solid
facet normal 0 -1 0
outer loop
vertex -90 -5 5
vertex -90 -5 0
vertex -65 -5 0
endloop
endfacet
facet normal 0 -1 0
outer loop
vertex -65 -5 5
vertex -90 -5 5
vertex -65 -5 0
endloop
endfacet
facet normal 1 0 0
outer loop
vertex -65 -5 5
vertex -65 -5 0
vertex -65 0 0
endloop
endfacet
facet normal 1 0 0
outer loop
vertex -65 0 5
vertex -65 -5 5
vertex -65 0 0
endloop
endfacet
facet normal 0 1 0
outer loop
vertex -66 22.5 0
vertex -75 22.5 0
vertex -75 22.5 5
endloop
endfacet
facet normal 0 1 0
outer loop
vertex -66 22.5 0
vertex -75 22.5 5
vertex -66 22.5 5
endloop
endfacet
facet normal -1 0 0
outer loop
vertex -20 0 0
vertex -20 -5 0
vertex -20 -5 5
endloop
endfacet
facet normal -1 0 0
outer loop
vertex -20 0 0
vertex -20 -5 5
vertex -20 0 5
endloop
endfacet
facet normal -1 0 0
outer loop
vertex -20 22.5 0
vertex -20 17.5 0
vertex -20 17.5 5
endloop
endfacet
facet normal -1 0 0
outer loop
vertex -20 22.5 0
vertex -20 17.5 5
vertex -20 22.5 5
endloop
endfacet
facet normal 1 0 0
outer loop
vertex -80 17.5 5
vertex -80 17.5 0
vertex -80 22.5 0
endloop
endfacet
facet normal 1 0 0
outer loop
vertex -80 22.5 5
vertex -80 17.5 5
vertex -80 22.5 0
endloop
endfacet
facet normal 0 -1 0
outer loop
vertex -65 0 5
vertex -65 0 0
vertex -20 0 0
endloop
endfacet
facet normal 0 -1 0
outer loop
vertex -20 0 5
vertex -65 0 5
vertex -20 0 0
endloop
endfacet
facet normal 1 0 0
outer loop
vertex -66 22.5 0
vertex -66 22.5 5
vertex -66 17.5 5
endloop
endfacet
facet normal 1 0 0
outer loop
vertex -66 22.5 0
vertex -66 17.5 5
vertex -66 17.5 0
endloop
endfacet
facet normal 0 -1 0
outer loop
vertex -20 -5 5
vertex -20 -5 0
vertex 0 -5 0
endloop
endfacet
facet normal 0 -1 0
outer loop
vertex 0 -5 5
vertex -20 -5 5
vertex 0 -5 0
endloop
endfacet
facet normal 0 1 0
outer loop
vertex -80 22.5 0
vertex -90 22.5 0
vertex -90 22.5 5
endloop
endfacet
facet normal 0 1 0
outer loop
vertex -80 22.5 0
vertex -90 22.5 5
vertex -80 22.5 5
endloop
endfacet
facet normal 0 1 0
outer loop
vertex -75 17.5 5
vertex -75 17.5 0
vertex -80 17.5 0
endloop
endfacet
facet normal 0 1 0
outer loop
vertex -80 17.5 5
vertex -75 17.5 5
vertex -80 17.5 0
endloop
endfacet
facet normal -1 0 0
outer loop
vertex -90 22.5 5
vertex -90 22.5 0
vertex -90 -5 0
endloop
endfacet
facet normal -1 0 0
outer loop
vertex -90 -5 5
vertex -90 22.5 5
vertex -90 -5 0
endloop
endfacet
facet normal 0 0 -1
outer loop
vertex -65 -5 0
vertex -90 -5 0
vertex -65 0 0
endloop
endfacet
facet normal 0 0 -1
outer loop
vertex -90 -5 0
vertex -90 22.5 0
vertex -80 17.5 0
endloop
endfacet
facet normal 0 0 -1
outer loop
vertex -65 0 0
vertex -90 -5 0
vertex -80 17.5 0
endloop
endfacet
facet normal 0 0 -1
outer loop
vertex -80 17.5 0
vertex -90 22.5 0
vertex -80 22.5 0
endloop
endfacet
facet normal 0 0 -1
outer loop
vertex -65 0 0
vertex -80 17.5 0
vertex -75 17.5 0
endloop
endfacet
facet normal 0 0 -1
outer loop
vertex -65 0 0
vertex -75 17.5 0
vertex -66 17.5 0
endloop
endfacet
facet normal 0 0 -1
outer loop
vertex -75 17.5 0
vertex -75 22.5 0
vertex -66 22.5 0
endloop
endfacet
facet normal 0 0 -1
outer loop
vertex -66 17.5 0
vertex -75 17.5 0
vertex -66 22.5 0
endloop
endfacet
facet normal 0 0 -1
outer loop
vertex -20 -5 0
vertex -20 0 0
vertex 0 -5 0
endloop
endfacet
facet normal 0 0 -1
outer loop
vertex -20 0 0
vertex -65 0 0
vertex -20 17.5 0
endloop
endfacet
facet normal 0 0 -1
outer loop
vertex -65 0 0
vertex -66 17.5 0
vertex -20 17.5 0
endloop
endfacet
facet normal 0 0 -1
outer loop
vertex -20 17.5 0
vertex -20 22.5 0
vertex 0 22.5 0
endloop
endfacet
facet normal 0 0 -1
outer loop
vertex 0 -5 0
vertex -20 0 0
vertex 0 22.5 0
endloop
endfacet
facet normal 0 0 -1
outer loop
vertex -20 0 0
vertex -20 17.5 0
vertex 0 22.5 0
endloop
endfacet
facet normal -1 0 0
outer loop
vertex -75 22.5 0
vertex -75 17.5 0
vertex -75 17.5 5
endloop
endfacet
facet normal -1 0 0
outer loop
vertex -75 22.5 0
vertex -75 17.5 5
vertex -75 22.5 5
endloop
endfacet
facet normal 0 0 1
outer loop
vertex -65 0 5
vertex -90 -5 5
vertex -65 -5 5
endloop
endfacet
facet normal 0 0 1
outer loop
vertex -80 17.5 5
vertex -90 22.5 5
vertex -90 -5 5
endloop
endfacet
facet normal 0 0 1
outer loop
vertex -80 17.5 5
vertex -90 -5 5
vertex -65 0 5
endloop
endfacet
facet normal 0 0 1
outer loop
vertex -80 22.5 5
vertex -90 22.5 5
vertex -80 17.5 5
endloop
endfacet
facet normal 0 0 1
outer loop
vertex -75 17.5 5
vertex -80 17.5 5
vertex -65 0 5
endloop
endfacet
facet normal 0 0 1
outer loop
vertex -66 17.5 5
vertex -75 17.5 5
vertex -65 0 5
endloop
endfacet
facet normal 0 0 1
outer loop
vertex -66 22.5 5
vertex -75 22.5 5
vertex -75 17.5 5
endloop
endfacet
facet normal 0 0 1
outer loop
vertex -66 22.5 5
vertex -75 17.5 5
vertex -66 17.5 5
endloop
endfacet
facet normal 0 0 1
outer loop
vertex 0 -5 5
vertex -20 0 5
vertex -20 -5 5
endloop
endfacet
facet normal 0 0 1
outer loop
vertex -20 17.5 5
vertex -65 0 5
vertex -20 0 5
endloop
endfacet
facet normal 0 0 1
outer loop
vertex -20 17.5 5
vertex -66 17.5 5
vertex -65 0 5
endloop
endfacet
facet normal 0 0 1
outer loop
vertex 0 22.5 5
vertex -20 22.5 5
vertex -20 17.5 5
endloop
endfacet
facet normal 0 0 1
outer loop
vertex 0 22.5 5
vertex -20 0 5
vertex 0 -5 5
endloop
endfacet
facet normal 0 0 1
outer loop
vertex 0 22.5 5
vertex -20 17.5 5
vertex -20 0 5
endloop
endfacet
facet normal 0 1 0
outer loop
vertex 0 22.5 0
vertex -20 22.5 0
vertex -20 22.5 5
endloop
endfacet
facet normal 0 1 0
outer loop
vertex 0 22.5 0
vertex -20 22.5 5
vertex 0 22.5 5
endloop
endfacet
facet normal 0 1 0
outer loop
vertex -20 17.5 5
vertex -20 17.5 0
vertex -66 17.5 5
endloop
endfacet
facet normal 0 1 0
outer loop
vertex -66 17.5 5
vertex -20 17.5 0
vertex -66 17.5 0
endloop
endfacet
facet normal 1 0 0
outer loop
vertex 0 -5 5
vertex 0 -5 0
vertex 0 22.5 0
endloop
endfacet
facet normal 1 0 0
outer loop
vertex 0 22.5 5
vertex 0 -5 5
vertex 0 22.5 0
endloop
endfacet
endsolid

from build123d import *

# Parameters (mm, degrees)
SKETCH1_W           = 10
SKETCH1_H           = 5
SKETCH1_W_2         = 25
SKETCH1_W_3         = 20
BOSS_EXTRUDE1_DEPTH = 5
SKETCH2_W           = 5
SKETCH2_H           = 5
CUT_EXTRUDE1_DEPTH  = 1


with BuildPart() as part:
    # Sketch1 → Boss-Extrude1 (new body)
    with BuildSketch(Plane.XY):
        Polygon((-20, 0), (0, 0), (0, 17.5), (-20, 17.5), (-65, 17.5), (-75, 17.5), (-80, 17.5), (-90, 17.5), (-90, 0), (-65, 0), align=None)
        with Locations((-85, 20)):
            Rectangle(SKETCH1_W, SKETCH1_H)
        with Locations((-70, 20)):
            Rectangle(SKETCH1_W, SKETCH1_H)
        with Locations((-77.5, -2.5)):
            Rectangle(SKETCH1_W_2, SKETCH1_H)
        with Locations((-10, -2.5)):
            Rectangle(SKETCH1_W_3, SKETCH1_H)
        with Locations((-10, 20)):
            Rectangle(SKETCH1_W_3, SKETCH1_H)
    extrude(amount=BOSS_EXTRUDE1_DEPTH)

    # Sketch2 → Cut-Extrude1 (cut)
    with BuildSketch(Plane(origin=(-65, 0, 0), x_dir=(0, 0, -1), z_dir=(1, 0, 0))):
        with Locations((-2.5, 20)):
            Rectangle(SKETCH2_W, SKETCH2_H)
    extrude(amount=-CUT_EXTRUDE1_DEPTH, mode=Mode.SUBTRACT)


solid = part.part
